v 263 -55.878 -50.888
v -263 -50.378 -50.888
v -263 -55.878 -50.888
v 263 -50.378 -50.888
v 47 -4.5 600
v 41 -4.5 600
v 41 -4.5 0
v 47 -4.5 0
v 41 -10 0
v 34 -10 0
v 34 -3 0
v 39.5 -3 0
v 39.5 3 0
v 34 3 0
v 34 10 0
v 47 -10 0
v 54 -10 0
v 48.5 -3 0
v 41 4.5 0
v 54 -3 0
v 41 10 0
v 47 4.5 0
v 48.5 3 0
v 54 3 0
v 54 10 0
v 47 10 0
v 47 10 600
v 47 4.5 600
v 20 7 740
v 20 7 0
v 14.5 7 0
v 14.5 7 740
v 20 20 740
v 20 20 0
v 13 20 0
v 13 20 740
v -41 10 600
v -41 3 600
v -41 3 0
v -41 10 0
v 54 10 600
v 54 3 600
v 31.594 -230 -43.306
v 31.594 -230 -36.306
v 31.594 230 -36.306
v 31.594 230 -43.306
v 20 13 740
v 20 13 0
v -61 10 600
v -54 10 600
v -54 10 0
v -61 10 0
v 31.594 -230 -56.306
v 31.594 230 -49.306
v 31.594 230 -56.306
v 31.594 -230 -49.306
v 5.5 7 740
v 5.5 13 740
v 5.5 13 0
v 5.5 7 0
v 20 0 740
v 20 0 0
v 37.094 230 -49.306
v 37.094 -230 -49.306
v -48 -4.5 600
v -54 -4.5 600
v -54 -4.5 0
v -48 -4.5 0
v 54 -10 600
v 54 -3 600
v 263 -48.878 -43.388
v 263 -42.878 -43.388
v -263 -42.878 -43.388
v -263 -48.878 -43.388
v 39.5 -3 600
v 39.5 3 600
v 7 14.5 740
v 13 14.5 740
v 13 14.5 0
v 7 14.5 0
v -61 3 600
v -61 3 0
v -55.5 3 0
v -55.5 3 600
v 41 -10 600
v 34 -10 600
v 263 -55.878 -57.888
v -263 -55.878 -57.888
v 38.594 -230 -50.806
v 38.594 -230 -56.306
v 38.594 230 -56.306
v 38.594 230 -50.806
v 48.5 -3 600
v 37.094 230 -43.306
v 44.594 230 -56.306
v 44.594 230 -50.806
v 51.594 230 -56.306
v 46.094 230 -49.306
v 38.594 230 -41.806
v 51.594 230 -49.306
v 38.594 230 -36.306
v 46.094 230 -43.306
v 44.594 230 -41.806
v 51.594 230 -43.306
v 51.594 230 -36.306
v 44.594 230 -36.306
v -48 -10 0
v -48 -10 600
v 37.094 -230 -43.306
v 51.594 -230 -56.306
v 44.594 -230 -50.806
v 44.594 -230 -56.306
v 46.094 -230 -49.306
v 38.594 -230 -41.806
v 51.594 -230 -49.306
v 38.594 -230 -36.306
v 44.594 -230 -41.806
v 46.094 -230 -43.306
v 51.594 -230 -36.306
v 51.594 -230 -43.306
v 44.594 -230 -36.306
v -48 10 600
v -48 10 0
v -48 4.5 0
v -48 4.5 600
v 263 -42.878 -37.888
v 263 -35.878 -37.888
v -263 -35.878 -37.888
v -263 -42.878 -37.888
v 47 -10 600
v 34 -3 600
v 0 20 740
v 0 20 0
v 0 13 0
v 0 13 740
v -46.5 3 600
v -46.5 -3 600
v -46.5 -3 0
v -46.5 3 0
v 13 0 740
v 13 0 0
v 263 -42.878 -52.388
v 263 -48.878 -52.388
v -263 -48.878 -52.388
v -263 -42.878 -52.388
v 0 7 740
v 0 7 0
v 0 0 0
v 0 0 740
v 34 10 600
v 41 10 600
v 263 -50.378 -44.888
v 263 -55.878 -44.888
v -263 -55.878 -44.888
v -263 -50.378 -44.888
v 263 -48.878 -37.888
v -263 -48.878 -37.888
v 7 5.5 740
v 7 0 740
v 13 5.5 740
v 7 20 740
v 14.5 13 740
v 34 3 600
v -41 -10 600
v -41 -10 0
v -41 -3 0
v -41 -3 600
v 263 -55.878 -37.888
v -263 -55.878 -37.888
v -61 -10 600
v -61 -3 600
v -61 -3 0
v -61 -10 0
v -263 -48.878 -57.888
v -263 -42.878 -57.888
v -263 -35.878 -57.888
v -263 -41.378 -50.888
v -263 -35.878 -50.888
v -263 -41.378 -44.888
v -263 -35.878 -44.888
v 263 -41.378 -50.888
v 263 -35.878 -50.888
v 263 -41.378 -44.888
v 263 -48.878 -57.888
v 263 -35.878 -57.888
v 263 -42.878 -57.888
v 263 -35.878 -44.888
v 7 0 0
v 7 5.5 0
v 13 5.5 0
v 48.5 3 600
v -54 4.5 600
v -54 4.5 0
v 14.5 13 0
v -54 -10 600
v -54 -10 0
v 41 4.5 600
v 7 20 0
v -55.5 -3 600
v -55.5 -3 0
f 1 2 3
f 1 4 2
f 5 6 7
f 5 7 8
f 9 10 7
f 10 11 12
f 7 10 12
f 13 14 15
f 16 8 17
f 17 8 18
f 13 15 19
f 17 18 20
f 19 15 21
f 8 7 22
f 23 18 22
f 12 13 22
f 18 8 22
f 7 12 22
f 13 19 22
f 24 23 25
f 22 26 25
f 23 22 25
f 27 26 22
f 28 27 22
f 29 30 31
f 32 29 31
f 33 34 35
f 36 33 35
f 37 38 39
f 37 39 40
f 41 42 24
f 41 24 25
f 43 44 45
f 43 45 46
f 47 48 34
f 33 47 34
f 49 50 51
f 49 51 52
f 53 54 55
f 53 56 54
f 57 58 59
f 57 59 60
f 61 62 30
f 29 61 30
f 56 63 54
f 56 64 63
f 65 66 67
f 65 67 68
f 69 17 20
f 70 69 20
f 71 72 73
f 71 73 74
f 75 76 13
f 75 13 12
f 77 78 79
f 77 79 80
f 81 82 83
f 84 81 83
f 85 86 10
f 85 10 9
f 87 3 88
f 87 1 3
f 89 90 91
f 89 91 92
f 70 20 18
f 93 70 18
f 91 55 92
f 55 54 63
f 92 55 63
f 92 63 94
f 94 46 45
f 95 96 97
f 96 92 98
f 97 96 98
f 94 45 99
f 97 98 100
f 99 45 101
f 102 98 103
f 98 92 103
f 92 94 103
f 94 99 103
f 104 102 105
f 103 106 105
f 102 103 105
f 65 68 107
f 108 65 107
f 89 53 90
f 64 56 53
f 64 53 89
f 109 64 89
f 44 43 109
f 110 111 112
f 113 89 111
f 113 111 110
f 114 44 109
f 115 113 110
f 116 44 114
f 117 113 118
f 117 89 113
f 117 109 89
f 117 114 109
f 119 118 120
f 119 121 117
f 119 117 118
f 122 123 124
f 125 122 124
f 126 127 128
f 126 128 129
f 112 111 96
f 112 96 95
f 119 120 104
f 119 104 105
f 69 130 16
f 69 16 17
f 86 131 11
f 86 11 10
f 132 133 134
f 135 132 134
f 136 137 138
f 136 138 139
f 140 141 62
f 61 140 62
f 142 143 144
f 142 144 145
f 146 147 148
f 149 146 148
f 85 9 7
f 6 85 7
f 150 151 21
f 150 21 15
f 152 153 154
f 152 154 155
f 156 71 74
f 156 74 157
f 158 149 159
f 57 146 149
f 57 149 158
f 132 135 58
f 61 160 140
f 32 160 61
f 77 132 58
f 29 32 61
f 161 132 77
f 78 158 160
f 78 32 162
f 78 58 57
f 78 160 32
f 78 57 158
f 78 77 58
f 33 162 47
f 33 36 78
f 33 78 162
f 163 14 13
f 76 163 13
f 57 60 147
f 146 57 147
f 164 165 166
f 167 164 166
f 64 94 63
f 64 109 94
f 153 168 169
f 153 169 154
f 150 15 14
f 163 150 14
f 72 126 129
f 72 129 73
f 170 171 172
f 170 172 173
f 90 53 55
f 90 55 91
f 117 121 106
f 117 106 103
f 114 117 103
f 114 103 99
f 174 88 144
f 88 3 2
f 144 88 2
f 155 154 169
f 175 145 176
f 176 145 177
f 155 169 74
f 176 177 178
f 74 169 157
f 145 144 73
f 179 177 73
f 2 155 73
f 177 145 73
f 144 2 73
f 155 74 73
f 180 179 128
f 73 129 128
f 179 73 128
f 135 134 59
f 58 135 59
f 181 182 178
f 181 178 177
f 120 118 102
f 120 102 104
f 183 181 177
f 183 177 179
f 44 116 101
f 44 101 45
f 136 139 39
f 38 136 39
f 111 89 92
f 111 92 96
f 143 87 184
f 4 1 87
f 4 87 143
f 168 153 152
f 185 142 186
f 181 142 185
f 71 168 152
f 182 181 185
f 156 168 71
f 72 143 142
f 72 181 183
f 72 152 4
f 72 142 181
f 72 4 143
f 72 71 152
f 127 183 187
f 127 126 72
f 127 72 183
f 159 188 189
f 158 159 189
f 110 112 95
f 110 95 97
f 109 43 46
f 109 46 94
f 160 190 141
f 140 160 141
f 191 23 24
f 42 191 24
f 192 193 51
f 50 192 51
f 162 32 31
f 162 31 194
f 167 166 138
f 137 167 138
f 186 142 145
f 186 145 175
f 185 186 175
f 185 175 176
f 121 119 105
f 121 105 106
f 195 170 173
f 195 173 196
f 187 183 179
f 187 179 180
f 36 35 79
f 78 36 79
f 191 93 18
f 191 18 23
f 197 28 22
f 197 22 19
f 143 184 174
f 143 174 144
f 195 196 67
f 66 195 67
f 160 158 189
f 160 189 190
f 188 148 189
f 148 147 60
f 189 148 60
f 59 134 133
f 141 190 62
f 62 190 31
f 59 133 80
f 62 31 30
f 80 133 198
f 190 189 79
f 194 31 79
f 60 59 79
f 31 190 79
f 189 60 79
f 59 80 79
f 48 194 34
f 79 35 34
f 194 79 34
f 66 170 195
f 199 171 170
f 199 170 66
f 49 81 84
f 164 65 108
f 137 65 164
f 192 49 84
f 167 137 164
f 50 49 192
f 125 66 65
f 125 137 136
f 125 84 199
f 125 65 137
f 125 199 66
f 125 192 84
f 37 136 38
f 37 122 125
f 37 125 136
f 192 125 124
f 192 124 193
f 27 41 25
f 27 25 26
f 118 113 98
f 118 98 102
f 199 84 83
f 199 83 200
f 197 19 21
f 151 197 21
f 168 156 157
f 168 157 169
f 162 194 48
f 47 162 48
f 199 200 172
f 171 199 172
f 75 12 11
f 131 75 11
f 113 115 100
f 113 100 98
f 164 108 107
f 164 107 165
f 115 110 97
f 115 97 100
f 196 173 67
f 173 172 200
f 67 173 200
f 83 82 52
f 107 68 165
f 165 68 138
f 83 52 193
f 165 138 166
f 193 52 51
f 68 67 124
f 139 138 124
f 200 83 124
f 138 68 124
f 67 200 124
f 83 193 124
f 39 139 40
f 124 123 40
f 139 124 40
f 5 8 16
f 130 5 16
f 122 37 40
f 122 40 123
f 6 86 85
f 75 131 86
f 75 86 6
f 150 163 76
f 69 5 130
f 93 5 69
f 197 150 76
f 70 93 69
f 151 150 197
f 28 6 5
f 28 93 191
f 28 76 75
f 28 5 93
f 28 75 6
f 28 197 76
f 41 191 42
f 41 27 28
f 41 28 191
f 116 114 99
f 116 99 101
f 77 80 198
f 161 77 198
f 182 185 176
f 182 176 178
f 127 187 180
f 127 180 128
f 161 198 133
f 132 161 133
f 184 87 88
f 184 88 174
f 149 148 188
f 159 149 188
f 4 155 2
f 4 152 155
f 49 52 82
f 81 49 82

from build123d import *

# Parameters (mm, degrees)
F1_DEPTH = 740
F3_DEPTH = 600
F5_DEPTH = 600
F7_DEPTH = 263
F9_DEPTH = 230


with BuildPart() as f1:
    # F0 (on Top) → F1 (new body)
    with BuildSketch(Plane.XY):
        Polygon((0, 7), (0, 0), (7, 0), (7, 5.5), (13, 5.5), (13, 0), (20, 0), (20, 7), (14.5, 7), (14.5, 13), (20, 13), (20, 20), (13, 20), (13, 14.5), (7, 14.5), (7, 20), (0, 20), (0, 13), (5.5, 13), (5.5, 7), align=None)
    extrude(amount=F1_DEPTH)


with BuildPart() as f3:
    # F2 (on Top) → F3 (new body)
    with BuildSketch(Plane.XY):
        Polygon((-61, -3), (-61, -10), (-54, -10), (-54, -4.5), (-48, -4.5), (-48, -10), (-41, -10), (-41, -3), (-46.5, -3), (-46.5, 3), (-41, 3), (-41, 10), (-48, 10), (-48, 4.5), (-54, 4.5), (-54, 10), (-61, 10), (-61, 3), (-55.5, 3), (-55.5, -3), align=None)
    extrude(amount=F3_DEPTH)


with BuildPart() as f5:
    # F4 (on Top) → F5 (new body)
    with BuildSketch(Plane.XY):
        Polygon((34, -3), (34, -10), (41, -10), (41, -4.5), (47, -4.5), (47, -10), (54, -10), (54, -3), (48.5, -3), (48.5, 3), (54, 3), (54, 10), (47, 10), (47, 4.5), (41, 4.5), (41, 10), (34, 10), (34, 3), (39.5, 3), (39.5, -3), align=None)
    extrude(amount=F5_DEPTH)


with BuildPart() as f7:
    # F6 (on Right) → F7 (new body, symmetric)
    with BuildSketch(Plane.YZ):
        Polygon((-55.878273, -50.887528), (-55.878273, -57.887528), (-48.878273, -57.887528), (-48.878273, -52.387528), (-42.878273, -52.387528), (-42.878273, -57.887528), (-35.878273, -57.887528), (-35.878273, -50.887528), (-41.378273, -50.887528), (-41.378273, -44.887528), (-35.878273, -44.887528), (-35.878273, -37.887528), (-42.878273, -37.887528), (-42.878273, -43.387528), (-48.878273, -43.387528), (-48.878273, -37.887528), (-55.878273, -37.887528), (-55.878273, -44.887528), (-50.378273, -44.887528), (-50.378273, -50.887528), align=None)
    extrude(amount=F7_DEPTH, both=True)


with BuildPart() as f9:
    # F8 (on Front) → F9 (new body, symmetric)
    with BuildSketch(Plane.XZ):
        Polygon((31.594177, -49.305582), (31.594177, -56.305582), (38.594177, -56.305582), (38.594177, -50.805582), (44.594177, -50.805582), (44.594177, -56.305582), (51.594177, -56.305582), (51.594177, -49.305582), (46.094177, -49.305582), (46.094177, -43.305582), (51.594177, -43.305582), (51.594177, -36.305582), (44.594177, -36.305582), (44.594177, -41.805582), (38.594177, -41.805582), (38.594177, -36.305582), (31.594177, -36.305582), (31.594177, -43.305582), (37.094177, -43.305582), (37.094177, -49.305582), align=None)
    extrude(amount=F9_DEPTH, both=True)


solid = Compound([f1.part, f3.part, f5.part, f7.part, f9.part])
